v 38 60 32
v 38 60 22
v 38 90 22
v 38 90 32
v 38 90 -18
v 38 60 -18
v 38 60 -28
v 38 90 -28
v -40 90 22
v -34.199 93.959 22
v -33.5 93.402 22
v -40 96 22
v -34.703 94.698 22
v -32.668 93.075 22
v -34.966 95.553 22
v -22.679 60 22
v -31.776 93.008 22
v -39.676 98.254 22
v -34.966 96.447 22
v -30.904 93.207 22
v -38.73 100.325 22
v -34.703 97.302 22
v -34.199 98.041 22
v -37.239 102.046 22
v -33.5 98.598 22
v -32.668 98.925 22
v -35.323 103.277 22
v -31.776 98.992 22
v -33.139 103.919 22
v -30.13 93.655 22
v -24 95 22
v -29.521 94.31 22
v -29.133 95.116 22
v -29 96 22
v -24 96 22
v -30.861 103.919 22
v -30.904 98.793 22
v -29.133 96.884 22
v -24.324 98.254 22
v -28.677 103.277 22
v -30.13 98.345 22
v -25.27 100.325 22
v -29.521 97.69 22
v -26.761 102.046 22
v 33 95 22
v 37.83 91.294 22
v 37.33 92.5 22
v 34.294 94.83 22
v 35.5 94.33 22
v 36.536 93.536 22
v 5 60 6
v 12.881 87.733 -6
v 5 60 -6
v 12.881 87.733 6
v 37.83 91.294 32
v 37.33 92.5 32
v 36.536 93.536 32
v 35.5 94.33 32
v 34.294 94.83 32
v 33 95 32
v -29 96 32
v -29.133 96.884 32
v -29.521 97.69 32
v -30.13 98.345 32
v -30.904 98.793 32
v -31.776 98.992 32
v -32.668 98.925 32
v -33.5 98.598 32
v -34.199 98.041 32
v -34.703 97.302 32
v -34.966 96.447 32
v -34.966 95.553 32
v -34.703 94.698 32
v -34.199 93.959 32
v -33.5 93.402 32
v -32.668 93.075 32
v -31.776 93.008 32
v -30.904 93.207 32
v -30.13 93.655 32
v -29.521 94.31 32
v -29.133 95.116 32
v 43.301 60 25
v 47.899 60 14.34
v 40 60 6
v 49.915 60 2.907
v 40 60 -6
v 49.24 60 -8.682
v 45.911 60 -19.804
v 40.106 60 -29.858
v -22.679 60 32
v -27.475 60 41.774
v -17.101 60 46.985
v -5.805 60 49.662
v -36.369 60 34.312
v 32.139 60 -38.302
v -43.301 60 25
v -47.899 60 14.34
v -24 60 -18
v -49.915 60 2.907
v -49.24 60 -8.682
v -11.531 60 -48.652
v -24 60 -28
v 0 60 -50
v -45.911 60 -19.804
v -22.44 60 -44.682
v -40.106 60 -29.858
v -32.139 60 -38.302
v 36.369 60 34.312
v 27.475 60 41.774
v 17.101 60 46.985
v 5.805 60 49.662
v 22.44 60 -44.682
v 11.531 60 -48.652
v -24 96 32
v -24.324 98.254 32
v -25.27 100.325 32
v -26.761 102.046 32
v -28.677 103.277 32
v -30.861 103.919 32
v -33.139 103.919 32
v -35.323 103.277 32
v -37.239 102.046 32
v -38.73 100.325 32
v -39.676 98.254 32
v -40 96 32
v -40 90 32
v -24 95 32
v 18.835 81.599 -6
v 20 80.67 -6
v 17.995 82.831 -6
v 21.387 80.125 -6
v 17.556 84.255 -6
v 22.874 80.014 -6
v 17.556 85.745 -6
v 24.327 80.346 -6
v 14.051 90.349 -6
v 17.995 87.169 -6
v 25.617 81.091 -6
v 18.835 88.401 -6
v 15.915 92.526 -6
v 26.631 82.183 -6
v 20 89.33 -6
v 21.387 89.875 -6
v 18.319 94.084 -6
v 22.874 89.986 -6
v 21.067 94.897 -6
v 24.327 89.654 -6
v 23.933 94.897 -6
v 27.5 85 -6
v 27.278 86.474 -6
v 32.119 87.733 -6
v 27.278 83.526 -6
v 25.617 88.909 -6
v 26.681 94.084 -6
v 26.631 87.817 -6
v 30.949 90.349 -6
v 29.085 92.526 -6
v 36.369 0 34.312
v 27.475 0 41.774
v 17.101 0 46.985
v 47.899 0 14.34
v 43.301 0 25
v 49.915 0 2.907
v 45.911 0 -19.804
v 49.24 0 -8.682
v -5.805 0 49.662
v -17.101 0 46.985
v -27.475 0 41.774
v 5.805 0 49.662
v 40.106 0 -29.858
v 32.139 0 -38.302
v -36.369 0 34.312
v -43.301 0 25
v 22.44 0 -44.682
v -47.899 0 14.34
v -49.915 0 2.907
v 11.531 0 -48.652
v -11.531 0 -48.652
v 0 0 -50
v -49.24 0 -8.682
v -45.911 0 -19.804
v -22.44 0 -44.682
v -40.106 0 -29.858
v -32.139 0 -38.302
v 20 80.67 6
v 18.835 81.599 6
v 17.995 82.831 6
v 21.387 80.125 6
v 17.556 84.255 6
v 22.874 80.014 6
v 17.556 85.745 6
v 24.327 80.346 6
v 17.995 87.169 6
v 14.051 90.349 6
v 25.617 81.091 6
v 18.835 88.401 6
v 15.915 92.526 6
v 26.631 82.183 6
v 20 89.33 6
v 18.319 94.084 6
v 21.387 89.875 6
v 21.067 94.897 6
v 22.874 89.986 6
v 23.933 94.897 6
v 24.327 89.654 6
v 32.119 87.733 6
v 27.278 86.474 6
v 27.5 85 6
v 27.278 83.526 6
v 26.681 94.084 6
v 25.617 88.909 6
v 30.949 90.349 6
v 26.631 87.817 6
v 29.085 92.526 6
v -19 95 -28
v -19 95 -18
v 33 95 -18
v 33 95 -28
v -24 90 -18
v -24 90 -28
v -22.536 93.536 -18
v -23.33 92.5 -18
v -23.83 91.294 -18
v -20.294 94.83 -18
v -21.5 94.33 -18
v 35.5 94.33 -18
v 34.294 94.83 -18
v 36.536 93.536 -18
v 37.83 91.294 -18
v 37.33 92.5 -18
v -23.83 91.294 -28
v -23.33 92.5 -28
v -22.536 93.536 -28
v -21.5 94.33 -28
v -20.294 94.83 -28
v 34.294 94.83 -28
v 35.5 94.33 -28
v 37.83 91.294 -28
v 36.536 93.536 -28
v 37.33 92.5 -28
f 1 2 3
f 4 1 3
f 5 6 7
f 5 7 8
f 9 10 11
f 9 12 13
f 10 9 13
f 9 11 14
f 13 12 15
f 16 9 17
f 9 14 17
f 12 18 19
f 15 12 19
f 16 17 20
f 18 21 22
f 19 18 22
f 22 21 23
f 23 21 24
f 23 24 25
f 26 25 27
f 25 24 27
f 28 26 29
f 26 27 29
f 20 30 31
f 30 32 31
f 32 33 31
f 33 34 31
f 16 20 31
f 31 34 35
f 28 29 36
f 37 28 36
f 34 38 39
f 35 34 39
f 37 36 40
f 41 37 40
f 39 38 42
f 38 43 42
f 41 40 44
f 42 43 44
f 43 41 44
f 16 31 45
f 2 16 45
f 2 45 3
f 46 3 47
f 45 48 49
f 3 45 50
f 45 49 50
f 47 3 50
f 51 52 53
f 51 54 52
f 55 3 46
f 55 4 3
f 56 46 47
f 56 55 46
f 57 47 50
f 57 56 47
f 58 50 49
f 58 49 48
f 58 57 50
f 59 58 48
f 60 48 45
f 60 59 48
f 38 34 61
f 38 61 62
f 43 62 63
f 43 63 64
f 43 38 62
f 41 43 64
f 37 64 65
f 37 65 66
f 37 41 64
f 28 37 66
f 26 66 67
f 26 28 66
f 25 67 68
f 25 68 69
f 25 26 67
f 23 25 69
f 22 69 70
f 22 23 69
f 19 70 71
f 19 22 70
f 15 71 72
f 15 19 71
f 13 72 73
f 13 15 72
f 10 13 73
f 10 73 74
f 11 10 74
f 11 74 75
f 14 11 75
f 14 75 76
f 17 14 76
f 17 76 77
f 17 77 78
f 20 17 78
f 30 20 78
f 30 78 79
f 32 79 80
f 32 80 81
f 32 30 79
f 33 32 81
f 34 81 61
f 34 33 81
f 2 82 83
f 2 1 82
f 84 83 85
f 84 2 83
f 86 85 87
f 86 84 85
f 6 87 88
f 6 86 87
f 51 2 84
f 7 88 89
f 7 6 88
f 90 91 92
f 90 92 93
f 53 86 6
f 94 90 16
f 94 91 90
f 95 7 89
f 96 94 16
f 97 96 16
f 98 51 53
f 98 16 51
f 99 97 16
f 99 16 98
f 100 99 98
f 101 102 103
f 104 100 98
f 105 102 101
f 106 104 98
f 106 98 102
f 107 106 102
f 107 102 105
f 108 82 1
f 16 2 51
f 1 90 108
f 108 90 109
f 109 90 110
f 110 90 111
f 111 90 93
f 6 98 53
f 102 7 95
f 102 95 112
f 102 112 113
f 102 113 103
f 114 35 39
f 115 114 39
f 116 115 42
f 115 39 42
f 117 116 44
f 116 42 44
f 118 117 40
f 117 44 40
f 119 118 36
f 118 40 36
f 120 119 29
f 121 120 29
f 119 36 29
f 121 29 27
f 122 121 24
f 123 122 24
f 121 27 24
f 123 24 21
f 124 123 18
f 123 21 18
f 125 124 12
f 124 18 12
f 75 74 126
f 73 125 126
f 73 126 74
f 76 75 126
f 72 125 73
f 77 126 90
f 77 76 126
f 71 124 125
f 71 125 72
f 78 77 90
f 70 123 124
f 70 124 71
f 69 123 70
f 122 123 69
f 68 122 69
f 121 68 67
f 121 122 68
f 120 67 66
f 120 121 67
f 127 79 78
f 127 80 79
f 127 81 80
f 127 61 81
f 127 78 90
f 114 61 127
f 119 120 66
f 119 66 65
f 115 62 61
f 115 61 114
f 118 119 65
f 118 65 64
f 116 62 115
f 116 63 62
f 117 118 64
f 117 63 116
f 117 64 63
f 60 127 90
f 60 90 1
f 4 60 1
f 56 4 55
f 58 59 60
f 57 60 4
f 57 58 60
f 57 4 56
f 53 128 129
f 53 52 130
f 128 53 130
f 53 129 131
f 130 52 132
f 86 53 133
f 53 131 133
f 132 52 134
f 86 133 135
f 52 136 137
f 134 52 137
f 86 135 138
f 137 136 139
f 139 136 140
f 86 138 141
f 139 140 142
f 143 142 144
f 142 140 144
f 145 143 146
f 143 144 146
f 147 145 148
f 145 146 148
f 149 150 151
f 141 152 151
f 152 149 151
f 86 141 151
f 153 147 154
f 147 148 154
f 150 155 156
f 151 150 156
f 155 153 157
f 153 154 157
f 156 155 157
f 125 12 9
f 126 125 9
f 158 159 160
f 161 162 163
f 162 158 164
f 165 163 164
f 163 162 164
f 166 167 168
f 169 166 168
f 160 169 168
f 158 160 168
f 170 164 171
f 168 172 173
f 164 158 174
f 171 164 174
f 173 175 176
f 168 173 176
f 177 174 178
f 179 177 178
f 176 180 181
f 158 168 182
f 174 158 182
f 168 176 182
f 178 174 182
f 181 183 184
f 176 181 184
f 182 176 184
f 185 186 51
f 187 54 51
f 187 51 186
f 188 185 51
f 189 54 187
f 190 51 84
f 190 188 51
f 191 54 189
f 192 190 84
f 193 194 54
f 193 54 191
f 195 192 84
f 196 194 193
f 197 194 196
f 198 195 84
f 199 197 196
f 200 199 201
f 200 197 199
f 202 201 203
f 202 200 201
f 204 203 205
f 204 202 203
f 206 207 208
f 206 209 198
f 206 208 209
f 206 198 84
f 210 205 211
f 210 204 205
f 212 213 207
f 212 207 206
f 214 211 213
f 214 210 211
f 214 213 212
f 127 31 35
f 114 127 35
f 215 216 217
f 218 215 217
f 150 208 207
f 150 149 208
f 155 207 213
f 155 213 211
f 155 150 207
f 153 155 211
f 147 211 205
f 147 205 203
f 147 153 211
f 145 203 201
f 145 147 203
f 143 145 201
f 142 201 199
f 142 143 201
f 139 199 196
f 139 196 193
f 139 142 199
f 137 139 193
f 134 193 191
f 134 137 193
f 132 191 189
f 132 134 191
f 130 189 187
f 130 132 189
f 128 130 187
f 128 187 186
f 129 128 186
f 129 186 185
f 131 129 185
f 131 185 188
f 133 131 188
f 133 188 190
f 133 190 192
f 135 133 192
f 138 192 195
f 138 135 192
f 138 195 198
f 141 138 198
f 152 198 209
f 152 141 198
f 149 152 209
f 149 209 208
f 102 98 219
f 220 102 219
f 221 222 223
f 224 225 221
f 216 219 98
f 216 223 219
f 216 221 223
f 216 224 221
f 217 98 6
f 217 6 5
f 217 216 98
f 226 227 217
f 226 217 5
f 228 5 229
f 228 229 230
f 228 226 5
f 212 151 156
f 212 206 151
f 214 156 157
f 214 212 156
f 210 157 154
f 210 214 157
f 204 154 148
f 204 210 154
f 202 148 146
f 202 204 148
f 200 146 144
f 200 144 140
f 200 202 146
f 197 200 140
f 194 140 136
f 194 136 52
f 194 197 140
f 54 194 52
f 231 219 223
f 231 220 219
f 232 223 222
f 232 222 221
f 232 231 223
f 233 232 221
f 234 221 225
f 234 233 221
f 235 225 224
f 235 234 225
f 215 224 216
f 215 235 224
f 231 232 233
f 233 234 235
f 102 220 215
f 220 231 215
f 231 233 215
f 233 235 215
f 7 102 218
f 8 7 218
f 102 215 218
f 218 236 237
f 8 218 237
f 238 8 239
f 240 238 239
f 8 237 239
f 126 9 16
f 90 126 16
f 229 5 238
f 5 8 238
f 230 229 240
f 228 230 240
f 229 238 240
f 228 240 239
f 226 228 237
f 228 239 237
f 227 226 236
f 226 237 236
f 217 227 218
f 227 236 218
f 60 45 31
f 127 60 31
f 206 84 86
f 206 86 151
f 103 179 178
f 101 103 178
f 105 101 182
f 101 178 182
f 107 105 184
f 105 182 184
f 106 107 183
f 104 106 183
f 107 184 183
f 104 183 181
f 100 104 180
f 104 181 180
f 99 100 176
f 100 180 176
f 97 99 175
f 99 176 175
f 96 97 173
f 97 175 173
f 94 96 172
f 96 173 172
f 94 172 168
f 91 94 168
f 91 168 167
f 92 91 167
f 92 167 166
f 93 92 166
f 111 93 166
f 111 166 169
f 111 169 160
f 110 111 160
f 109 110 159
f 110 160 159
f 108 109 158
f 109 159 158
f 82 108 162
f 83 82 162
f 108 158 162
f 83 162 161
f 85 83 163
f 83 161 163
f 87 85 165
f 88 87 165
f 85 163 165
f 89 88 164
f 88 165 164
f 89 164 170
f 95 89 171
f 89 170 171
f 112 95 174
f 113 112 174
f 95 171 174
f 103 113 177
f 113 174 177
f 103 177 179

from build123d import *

# Parameters (mm, degrees)
SKETCH_1_R      = 50
EXTRUDE_1_DEPTH = 60
EXTRUDE_START   = 22
SKETCH_2_R      = 3
EXTRUDE_2_DEPTH = 10
EXTRUDE_START_2 = -18
SKETCH_3_W      = 62
SKETCH_3_H      = 35
EXTRUDE_3_DEPTH = 10
FILLET_1_R      = 5
SKETCH_4_R      = 5
EXTRUDE_4_DEPTH = 6


with BuildPart() as part:
    # 草图1 → 凸台-拉伸1 (new body)
    with BuildSketch(Plane(origin=(0, 0, 0), x_dir=(1, 0, 0), z_dir=(0, 1, 0))):
        with Locations(Location((0, 0, 0), (0, 0, 90))):
            Circle(SKETCH_1_R)
    extrude(amount=EXTRUDE_1_DEPTH)

    # 草图2 → 凸台-拉伸2 (add)
    with BuildSketch(Plane.XY.offset(EXTRUDE_START)):
        with BuildLine():
            Line((38, 60), (38, 95))
            Line((38, 95), (-24, 95))
            Line((-24, 95), (-24, 96))
            ThreePointArc((-24, 96), (-32, 104), (-40, 96))
            Line((-40, 96), (-40, 90))
            Line((-40, 90), (-22.679491924, 60))
            Line((-22.679491924, 60), (38, 60))
        make_face()
        with Locations((-32, 96)):
            Circle(SKETCH_2_R, mode=Mode.SUBTRACT)
    extrude(amount=EXTRUDE_2_DEPTH)

    # 草图3 → 凸台-拉伸3 (add)
    with BuildSketch(Plane.XY.offset(EXTRUDE_START_2)):
        with Locations((7, 77.5)):
            Rectangle(SKETCH_3_W, SKETCH_3_H)
    extrude(amount=-EXTRUDE_3_DEPTH)

    # 圆角1
    fillet_1_edges = [part.edges().sort_by_distance(p)[0] for p in [
        (38, 95, 27),
        (38, 95, -23),
        (-24, 95, -23),
    ]]
    fillet(fillet_1_edges, radius=FILLET_1_R)

    # 草图4 → 凸台-拉伸4 (add, symmetric)
    with BuildSketch(Plane.XY):
        with BuildLine():
            Line((12.880830473, 87.733418669), (5, 60))
            Line((5, 60), (40, 60))
            Line((40, 60), (32.119169527, 87.733418669))
            ThreePointArc((32.119169527, 87.733418669), (22.5, 95), (12.880830473, 87.733418669))
        make_face()
        with Locations((22.5, 85)):
            Circle(SKETCH_4_R, mode=Mode.SUBTRACT)
    extrude(amount=EXTRUDE_4_DEPTH, both=True)


solid = part.part
